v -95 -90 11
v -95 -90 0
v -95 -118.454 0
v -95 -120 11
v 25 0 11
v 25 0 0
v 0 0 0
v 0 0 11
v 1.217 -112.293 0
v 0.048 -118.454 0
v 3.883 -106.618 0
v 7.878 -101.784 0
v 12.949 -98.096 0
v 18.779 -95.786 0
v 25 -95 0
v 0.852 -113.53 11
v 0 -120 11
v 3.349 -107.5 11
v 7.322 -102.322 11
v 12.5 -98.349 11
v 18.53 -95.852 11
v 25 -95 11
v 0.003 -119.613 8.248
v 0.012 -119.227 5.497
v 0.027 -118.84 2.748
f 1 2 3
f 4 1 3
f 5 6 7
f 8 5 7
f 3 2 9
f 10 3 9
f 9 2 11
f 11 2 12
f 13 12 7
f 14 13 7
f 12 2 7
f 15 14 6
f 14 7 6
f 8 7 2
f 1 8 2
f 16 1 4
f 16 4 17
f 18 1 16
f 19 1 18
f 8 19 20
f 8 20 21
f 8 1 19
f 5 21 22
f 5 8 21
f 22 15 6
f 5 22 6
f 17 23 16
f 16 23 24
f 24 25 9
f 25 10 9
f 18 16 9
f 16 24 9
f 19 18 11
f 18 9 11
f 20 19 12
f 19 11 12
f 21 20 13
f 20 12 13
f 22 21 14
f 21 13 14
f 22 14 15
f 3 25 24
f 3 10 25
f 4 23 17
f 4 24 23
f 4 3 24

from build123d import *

# Parameters (mm, degrees)
BOSS_EXTRUDE1_DEPTH = 11
CUT_EXTRUDE1_DEPTH  = 114


with BuildPart() as part:
    # Sketch1 → Boss-Extrude1 (new body)
    with BuildSketch(Plane.XY):
        with BuildLine():
            Line((25, 0), (0, 0))
            Line((0, 0), (-95, -90))
            Line((-95, -90), (-95, -120))
            Line((-95, -120), (0, -120))
            ThreePointArc((0, -120), (7.32233047, -102.32233047), (25, -95))
            Line((25, -95), (25, 0))
        make_face()
    extrude(amount=BOSS_EXTRUDE1_DEPTH)

    # Sketch2 → Cut-Extrude1 (cut)
    with BuildSketch(Plane.ZY.offset(95)):
        Polygon((0, -120), (0, -118.454050818), (11, -120), align=None)
    extrude(amount=-CUT_EXTRUDE1_DEPTH, mode=Mode.SUBTRACT)


solid = part.part
